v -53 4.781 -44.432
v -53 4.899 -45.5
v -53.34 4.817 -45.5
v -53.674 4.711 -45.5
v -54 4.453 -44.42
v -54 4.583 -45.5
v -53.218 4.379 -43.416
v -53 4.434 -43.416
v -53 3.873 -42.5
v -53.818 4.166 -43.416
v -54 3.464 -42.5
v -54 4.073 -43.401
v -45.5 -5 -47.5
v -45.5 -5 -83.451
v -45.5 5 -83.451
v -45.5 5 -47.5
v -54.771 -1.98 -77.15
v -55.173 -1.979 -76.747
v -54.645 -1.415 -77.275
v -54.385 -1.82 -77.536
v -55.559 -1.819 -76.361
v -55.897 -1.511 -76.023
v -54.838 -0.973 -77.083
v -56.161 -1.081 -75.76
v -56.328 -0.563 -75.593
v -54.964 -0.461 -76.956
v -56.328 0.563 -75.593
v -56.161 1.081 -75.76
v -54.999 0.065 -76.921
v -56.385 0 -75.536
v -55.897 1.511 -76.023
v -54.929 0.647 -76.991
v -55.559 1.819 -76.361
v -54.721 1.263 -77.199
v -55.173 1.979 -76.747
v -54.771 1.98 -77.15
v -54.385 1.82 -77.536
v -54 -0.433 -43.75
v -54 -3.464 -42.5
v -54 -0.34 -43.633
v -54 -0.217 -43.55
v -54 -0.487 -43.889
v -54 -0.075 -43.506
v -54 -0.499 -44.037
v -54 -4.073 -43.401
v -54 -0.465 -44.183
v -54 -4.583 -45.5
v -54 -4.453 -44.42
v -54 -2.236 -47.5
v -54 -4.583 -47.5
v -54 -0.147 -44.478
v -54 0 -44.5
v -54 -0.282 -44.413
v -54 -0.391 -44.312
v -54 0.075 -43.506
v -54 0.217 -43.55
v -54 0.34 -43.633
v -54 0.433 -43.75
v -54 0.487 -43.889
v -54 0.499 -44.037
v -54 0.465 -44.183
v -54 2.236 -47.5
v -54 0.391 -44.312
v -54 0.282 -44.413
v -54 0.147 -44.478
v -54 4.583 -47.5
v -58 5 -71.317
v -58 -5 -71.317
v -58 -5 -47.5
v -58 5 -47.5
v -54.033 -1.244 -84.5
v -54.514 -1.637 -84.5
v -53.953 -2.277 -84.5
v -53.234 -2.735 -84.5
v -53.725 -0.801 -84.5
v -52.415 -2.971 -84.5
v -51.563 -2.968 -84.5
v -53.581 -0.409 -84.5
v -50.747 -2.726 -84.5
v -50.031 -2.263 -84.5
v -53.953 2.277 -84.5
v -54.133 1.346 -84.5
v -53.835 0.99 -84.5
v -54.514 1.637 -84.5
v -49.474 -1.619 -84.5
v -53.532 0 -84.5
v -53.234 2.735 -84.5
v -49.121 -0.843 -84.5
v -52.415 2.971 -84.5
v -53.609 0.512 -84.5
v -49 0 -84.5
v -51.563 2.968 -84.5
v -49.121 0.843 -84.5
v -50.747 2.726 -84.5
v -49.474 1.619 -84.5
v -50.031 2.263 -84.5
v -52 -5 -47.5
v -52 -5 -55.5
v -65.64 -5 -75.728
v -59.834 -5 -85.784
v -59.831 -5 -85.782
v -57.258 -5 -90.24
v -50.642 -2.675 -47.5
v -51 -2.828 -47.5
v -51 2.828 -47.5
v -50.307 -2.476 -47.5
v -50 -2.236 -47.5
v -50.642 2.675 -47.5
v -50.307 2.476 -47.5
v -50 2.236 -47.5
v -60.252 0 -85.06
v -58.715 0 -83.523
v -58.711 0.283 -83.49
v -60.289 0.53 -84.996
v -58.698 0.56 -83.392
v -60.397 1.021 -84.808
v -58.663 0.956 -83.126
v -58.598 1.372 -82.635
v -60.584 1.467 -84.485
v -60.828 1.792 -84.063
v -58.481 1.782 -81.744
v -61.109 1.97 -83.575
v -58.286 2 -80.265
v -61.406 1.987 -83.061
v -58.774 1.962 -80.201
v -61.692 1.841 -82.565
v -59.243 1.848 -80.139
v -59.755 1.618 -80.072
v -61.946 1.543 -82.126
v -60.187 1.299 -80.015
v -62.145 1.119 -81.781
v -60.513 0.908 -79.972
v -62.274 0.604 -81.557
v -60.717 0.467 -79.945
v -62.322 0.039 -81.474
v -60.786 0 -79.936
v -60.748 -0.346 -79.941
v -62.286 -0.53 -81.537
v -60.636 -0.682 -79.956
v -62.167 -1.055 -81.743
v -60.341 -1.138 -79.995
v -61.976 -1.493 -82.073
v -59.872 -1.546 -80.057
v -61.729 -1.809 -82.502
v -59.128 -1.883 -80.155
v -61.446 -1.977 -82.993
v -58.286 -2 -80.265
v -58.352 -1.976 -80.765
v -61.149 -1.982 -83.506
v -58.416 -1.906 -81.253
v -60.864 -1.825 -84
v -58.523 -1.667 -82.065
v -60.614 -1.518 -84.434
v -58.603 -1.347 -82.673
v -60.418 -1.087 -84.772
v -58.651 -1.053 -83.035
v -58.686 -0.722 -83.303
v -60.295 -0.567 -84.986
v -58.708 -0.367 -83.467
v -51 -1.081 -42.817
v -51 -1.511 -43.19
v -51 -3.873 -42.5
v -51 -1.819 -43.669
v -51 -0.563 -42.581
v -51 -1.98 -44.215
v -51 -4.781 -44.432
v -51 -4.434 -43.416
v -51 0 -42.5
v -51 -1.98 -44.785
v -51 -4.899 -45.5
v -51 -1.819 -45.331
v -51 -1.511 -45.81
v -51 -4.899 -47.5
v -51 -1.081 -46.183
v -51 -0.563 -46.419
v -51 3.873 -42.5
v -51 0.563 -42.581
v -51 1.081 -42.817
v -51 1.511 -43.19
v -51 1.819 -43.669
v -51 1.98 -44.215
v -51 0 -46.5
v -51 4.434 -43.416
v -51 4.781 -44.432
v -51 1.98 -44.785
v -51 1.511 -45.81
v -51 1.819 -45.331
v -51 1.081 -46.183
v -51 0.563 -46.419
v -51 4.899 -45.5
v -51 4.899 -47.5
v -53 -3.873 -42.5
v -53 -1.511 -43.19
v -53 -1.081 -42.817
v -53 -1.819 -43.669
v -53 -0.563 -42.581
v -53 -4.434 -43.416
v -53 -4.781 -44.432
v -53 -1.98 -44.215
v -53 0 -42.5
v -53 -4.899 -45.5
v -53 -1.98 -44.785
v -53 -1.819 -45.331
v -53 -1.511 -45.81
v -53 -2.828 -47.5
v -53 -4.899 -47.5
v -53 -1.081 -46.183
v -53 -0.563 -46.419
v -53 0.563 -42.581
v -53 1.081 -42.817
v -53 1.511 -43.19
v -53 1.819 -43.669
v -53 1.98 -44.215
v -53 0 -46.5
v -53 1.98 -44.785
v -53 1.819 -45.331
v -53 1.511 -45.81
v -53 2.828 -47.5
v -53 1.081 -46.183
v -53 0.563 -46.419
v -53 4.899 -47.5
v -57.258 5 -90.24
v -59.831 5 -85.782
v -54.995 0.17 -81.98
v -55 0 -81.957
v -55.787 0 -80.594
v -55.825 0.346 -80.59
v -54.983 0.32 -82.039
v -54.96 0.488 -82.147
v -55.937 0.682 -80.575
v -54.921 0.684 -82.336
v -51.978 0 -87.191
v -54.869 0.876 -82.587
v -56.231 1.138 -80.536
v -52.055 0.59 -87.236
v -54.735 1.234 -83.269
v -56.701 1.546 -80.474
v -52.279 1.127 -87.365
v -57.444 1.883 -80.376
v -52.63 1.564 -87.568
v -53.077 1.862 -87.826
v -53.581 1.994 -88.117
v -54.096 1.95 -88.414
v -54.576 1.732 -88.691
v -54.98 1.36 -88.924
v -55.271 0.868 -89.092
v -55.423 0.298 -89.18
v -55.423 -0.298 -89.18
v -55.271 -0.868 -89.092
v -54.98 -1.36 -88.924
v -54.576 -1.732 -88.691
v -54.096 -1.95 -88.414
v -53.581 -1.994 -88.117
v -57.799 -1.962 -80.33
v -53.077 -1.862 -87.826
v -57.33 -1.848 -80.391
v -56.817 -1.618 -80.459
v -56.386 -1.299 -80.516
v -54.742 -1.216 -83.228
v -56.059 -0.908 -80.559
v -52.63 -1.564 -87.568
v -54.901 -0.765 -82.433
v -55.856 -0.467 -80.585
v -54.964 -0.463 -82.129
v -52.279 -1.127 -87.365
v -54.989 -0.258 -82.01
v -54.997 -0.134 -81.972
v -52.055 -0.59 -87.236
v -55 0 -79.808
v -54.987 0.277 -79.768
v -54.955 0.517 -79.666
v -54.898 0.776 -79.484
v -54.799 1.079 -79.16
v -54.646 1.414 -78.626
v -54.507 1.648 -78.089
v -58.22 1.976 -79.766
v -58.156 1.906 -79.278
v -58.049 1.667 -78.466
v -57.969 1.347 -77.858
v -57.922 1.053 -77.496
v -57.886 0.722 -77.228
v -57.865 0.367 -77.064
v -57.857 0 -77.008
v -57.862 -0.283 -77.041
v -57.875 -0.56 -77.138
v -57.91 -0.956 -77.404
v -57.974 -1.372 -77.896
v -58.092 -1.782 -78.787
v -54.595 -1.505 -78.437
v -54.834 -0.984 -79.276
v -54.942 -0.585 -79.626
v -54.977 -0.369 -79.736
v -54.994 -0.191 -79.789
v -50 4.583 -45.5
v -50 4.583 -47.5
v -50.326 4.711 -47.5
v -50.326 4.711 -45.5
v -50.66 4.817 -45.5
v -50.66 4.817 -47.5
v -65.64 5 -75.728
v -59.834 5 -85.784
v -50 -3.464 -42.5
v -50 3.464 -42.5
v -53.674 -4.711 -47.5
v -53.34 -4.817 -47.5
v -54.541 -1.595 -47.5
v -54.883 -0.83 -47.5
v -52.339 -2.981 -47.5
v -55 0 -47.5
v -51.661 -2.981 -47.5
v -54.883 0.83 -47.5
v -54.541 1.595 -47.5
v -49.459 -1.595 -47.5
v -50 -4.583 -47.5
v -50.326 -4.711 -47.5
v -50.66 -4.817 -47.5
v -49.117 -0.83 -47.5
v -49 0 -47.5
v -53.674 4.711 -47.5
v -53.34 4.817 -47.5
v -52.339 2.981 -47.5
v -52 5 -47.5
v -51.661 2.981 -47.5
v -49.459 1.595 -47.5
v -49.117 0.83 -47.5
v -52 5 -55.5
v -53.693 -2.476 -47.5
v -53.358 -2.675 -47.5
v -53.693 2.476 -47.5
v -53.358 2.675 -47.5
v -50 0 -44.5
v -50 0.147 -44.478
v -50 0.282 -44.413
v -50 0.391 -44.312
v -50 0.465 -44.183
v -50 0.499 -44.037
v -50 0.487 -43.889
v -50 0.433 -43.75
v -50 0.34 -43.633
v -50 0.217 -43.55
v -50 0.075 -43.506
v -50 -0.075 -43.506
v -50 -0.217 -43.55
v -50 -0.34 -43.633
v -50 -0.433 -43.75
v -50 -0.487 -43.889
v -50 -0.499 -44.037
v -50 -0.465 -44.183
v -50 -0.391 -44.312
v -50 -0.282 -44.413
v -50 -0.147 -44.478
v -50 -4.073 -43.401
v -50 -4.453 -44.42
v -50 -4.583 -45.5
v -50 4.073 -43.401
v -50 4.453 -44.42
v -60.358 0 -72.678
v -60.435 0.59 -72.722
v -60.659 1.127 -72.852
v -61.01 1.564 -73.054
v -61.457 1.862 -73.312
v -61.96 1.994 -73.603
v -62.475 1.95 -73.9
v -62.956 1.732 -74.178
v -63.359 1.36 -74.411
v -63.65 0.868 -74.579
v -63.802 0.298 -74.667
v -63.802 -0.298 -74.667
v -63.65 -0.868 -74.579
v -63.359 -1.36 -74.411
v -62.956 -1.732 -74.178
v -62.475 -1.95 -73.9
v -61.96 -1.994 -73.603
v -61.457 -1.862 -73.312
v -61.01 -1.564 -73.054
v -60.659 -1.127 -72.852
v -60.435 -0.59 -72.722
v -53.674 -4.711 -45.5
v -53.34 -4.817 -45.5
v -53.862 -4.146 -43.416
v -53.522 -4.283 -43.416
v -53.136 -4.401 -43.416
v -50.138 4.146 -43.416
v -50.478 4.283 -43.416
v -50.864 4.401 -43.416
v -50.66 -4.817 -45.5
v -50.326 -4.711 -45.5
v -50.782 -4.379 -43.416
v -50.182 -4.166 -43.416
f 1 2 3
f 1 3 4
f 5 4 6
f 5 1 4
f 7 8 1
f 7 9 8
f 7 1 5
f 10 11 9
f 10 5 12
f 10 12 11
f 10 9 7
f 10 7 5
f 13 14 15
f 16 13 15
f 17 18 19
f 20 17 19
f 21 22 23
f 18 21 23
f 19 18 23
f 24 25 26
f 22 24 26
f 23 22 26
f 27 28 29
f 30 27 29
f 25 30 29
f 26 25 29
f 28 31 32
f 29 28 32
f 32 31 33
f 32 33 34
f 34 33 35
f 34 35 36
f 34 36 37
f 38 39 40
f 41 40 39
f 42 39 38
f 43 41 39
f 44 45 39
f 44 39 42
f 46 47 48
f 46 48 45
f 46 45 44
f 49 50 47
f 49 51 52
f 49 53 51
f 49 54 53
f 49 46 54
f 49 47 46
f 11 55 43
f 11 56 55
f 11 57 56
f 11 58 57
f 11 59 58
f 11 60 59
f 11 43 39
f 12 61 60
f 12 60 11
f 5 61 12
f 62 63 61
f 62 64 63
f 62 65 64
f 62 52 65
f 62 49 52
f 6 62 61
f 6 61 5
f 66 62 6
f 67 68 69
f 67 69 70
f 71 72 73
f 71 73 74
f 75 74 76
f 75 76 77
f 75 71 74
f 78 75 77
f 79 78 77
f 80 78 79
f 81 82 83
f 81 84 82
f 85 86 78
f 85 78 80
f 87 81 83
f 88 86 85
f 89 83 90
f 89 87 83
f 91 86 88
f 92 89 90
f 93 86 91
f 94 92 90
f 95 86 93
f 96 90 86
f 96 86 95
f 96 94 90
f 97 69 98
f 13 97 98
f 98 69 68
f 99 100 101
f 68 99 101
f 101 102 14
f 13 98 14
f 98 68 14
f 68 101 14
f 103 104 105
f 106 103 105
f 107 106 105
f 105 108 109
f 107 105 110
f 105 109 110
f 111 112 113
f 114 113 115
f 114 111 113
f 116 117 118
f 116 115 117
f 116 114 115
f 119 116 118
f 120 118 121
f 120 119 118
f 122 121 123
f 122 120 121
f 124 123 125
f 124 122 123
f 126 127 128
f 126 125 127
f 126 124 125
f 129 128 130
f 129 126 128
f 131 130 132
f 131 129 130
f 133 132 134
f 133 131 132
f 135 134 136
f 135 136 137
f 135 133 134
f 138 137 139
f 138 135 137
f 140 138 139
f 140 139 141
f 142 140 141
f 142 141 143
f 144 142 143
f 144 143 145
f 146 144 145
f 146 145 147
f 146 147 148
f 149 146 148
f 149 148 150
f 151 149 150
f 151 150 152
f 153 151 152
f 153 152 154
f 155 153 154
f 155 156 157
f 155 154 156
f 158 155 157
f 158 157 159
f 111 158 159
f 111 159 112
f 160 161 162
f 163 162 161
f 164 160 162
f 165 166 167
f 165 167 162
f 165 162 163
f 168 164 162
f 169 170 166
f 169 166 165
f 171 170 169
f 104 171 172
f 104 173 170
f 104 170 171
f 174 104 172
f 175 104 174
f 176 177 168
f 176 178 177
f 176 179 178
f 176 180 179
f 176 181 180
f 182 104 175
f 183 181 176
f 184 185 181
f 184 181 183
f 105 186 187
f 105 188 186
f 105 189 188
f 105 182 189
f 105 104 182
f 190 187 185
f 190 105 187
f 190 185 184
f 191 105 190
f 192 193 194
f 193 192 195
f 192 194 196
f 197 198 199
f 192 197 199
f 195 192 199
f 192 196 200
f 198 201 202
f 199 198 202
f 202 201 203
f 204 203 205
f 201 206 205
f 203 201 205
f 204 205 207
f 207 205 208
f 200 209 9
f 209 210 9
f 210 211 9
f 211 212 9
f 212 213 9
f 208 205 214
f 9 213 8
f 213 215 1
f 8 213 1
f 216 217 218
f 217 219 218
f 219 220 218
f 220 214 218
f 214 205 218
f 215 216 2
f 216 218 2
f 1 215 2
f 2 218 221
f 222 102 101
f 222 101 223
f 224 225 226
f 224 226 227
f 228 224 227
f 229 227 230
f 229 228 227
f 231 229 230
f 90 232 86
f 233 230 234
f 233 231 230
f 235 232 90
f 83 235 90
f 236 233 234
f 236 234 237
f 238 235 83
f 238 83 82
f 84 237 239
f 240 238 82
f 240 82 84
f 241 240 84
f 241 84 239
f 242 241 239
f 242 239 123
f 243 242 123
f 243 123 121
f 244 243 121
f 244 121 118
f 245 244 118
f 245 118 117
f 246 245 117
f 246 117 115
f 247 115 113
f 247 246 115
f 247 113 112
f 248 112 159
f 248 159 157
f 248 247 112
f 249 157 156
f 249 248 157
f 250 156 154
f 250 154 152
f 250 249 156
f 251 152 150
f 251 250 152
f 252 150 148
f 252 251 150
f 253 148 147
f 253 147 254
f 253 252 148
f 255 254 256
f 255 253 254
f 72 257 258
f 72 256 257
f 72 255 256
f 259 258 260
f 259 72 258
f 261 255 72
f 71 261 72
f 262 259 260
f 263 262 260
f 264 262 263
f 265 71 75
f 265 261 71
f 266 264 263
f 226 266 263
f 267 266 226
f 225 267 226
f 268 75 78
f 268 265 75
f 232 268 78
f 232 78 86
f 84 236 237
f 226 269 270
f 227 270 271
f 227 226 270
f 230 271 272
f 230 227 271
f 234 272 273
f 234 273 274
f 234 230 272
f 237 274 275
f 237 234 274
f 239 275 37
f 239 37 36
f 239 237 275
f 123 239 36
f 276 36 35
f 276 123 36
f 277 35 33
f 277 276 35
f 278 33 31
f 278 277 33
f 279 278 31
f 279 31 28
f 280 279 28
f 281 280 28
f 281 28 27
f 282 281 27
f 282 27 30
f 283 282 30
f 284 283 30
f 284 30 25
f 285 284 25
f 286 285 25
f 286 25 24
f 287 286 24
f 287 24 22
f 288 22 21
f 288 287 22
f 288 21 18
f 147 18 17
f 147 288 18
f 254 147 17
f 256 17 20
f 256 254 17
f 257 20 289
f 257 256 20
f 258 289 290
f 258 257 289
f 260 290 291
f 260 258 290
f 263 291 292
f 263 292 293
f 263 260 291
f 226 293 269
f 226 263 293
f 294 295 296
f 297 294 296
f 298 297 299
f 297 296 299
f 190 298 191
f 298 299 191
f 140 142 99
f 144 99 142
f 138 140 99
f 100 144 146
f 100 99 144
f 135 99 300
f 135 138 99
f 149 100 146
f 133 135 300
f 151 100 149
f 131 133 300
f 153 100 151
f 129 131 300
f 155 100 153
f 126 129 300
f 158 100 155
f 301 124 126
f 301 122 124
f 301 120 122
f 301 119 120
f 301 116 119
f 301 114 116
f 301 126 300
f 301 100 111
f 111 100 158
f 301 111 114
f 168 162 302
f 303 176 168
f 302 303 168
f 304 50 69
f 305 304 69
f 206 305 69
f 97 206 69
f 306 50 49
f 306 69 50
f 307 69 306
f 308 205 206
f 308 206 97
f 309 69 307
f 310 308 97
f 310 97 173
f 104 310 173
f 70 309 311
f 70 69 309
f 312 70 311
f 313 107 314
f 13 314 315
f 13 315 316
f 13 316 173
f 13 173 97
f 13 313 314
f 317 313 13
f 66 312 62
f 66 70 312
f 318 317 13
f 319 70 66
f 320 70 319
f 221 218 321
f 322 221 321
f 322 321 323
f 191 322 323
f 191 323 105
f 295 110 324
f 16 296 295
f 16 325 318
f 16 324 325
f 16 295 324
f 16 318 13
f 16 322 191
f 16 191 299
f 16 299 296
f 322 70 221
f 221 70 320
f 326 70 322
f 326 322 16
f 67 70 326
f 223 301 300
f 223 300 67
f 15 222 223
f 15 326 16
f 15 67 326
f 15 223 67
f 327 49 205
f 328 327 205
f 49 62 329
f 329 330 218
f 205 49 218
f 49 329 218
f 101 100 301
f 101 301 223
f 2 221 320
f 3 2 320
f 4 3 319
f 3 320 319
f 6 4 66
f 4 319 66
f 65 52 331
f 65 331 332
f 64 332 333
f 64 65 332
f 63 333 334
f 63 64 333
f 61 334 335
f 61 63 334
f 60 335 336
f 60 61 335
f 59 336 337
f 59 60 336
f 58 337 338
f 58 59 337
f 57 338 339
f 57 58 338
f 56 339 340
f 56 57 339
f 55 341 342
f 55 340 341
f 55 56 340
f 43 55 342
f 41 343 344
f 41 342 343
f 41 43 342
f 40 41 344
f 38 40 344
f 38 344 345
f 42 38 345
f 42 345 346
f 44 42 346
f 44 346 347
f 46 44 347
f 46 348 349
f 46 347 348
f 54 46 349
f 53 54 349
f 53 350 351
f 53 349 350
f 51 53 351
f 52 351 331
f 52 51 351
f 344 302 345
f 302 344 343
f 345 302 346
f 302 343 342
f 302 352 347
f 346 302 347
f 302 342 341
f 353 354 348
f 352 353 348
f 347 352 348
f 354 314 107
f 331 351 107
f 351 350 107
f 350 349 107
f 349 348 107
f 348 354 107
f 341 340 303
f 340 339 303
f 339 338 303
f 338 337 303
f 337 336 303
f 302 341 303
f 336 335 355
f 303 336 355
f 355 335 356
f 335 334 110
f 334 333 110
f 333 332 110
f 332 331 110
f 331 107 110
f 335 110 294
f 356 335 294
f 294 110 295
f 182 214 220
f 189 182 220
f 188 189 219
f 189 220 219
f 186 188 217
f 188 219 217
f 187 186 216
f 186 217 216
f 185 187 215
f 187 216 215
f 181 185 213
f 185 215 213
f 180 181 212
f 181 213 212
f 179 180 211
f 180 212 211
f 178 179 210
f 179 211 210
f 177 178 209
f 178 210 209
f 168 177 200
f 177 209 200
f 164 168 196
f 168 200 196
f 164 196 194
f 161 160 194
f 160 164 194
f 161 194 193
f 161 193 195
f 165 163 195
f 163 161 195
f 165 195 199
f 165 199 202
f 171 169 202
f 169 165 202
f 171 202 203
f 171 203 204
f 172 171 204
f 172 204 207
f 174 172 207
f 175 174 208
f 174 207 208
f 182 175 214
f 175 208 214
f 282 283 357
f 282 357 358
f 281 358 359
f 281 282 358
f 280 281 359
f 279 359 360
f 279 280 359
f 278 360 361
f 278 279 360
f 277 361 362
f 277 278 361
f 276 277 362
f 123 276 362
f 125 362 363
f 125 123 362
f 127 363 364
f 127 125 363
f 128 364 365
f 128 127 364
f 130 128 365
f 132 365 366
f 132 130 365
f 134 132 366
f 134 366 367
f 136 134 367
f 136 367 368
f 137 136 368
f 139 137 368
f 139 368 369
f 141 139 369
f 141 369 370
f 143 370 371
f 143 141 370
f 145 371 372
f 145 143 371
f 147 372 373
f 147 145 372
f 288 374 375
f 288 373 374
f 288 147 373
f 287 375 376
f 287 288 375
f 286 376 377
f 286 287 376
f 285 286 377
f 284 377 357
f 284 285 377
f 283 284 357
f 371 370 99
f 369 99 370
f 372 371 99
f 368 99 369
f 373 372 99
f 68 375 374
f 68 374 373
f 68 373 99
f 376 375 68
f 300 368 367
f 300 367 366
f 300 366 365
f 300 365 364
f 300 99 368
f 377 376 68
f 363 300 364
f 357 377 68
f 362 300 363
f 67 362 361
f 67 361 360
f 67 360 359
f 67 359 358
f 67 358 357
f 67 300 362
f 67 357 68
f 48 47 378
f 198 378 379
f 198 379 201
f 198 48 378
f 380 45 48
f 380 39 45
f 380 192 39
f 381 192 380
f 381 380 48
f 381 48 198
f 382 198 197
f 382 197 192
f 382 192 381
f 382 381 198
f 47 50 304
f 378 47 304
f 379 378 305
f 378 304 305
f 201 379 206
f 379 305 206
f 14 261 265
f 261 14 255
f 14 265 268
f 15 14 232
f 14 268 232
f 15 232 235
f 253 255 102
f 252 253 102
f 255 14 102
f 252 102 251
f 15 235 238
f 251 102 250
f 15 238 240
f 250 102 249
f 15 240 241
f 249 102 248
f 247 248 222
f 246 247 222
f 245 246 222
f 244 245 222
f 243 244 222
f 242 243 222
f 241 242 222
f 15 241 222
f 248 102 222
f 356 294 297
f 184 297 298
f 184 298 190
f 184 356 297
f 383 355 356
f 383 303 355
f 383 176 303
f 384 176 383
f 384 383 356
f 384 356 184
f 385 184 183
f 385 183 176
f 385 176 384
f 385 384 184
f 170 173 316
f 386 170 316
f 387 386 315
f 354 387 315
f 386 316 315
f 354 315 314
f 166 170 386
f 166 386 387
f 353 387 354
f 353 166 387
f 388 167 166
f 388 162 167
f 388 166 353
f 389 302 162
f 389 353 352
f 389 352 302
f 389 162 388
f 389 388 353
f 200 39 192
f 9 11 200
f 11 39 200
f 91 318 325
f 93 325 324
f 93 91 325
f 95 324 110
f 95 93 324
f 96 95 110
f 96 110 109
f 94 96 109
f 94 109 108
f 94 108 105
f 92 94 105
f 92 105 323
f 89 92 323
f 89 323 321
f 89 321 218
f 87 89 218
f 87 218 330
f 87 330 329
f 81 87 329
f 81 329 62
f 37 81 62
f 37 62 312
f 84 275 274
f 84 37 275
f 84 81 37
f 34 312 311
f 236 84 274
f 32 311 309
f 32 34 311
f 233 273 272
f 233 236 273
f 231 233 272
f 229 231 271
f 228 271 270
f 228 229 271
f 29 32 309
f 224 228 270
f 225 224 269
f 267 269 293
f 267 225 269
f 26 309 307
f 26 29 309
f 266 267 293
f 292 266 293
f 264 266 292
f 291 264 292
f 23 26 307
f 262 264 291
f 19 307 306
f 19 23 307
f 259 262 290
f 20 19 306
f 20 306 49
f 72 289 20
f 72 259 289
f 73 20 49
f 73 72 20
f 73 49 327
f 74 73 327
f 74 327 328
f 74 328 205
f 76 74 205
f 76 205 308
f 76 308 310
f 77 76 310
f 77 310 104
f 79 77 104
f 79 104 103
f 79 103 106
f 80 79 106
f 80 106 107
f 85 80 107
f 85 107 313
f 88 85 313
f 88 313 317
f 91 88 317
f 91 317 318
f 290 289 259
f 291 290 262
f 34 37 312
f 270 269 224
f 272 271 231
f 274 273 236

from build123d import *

# Parameters (mm, degrees)
BOX139_W                    = 15
BOX139_H                    = 21
BOX139_DEPTH                = 23
BOX139_PLACEMENT_ANGLE      = 60
CYLINDER260_R               = 2
CYLINDER260_DEPTH           = 46
CYLINDER260_PLACEMENT_ANGLE = 330
CYLINDER227_R               = 2
CYLINDER227_DEPTH           = 10
CYLINDER227_PLACEMENT_ANGLE = 45
CYLINDER224_R               = 3
CYLINDER224_DEPTH           = 37
CYLINDER222_R               = 0.5
CYLINDER222_DEPTH           = 10
CYLINDER219_R               = 2
CYLINDER219_DEPTH           = 4
CYLINDER223_R               = 3
CYLINDER223_DEPTH           = 10
BOX110_W                    = 10
BOX110_H                    = 10
BOX110_DEPTH                = 10
BOX108_W                    = 2
BOX108_H                    = 10
BOX108_DEPTH                = 10
BOX109_W                    = 10
BOX109_H                    = 10
BOX109_DEPTH                = 10
CYLINDER221_R               = 5
CYLINDER221_DEPTH           = 10
CYLINDER220_R               = 5
CYLINDER220_DEPTH           = 10
BOX101_W                    = 10
BOX101_H                    = 10
BOX101_DEPTH                = 20
BOX101_PLACEMENT_ANGLE      = 330
BOX100_W                    = 12
BOX100_H                    = 10
BOX100_DEPTH                = 17
BOX100_PLACEMENT_ANGLE      = 30
BOX098_W                    = 12.5
BOX098_H                    = 10
BOX098_DEPTH                = 43


with BuildPart() as cube139:
    # Box139 → Box139 (new body)
    with BuildSketch(Plane.XY):
        with Locations((7.5, 10.5)):
            Rectangle(BOX139_W, BOX139_H)
    extrude(amount=BOX139_DEPTH)


with BuildPart() as cube139_1:
    # Box139 placement: moved
    add(cube139.part.moved(Location((-59.2, -11, -91.360962))).rotate(Axis((-59.2, -11, -91.360962), (0, 1, 0)), BOX139_PLACEMENT_ANGLE))


with BuildPart() as cylinder260:
    # Cylinder260 → Cylinder260 (new body)
    with BuildSketch(Plane.XY):
        Circle(CYLINDER260_R)
    extrude(amount=CYLINDER260_DEPTH)


with BuildPart() as cylinder260_1:
    # Cylinder260 placement: moved
    add(cylinder260.part.moved(Location((-50.83, 0, -93.18))).rotate(Axis((-50.83, 0, -93.18), (0, 1, 0)), CYLINDER260_PLACEMENT_ANGLE))


with BuildPart() as cylinder227:
    # Cylinder227 → Cylinder227 (new body)
    with BuildSketch(Plane.XY):
        Circle(CYLINDER227_R)
    extrude(amount=CYLINDER227_DEPTH)


with BuildPart() as cylinder227_1:
    # Cylinder227 placement: moved
    add(cylinder227.part.moved(Location((-62.041631, 0, -84.020815))).rotate(Axis((-62.041631, 0, -84.020815), (0, 1, 0)), CYLINDER227_PLACEMENT_ANGLE))


with BuildPart() as cylinder224:
    # Cylinder224 → Cylinder224 (new body)
    with BuildSketch(Plane(origin=(-52, 0, -84.5), x_dir=(1, 0, 0), z_dir=(0, 0, 1))):
        Circle(CYLINDER224_R)
    extrude(amount=CYLINDER224_DEPTH)


with BuildPart() as cylinder222:
    # Cylinder222 → Cylinder222 (new body)
    with BuildSketch(Plane(origin=(-5, 0, -7), x_dir=(0, 0, -1), z_dir=(1, 0, 0))):
        Circle(CYLINDER222_R)
    extrude(amount=CYLINDER222_DEPTH)


with BuildPart() as cylinder219:
    # Cylinder219 → Cylinder219 (new body)
    with BuildSketch(Plane(origin=(-2, -50, 1), x_dir=(0, 0, -1), z_dir=(1, 0, 0))):
        Circle(CYLINDER219_R)
    extrude(amount=CYLINDER219_DEPTH)


with BuildPart() as cylinder223:
    # Cylinder223 → Cylinder223 (new body)
    with BuildSketch(Plane(origin=(0, -50, -12), x_dir=(1, 0, 0), z_dir=(0, 0, 1))):
        Circle(CYLINDER223_R)
    extrude(amount=CYLINDER223_DEPTH)


with BuildPart() as cube110:
    # Box110 → Box110 (new body)
    with BuildSketch(Plane(origin=(-12, -55, -2), x_dir=(1, 0, 0), z_dir=(0, 0, 1))):
        with Locations((5, 5)):
            Rectangle(BOX110_W, BOX110_H)
    extrude(amount=BOX110_DEPTH)


with BuildPart() as cube108:
    # Box108 → Box108 (new body)
    with BuildSketch(Plane(origin=(-1, -55, -2), x_dir=(1, 0, 0), z_dir=(0, 0, 1))):
        with Locations((1, 5)):
            Rectangle(BOX108_W, BOX108_H)
    extrude(amount=BOX108_DEPTH)


with BuildPart() as cube109:
    # Box109 → Box109 (new body)
    with BuildSketch(Plane(origin=(2, -55, -2), x_dir=(1, 0, 0), z_dir=(0, 0, 1))):
        with Locations((5, 5)):
            Rectangle(BOX109_W, BOX109_H)
    extrude(amount=BOX109_DEPTH)


with BuildPart() as cylinder221:
    # Cylinder221 → Cylinder221 (new body)
    with BuildSketch(Plane(origin=(0, -50, -10), x_dir=(1, 0, 0), z_dir=(0, 0, 1))):
        Circle(CYLINDER221_R)
    extrude(amount=CYLINDER221_DEPTH)


with BuildPart() as sphere045:
    # Sphere045 → Sphere045 (revolve)
    with BuildSketch(Plane.XZ.offset(50)):
        with BuildLine():
            ThreePointArc((5, 0), (3.535534, 3.535534), (0, 5))
            Line((0, 5), (0, 0))
            Line((0, 0), (5, 0))
        make_face()
    revolve(axis=Axis((0, -50, 0), (0, 0, 1)))


with BuildPart() as cut204006013:
    # Cylinder220 → Cylinder220 (new body)
    with BuildSketch(Plane(origin=(0, -50, -7), x_dir=(1, 0, 0), z_dir=(0, 0, 1))):
        Circle(CYLINDER220_R)
    extrude(amount=CYLINDER220_DEPTH)

    # Common038: intersect Sphere045
    add(sphere045.part, mode=Mode.INTERSECT)

    # Fusion005077020006: union Cylinder221
    add(cylinder221.part)

    # Cut204006012: cut Cube109
    add(cube109.part, mode=Mode.SUBTRACT)

    # Cut204006014: cut Cube108
    add(cube108.part, mode=Mode.SUBTRACT)

    # Cut204006015: cut Cube110
    add(cube110.part, mode=Mode.SUBTRACT)

    # Cut204006011: cut Cylinder223
    add(cylinder223.part, mode=Mode.SUBTRACT)

    # Fusion005077020005: union Cylinder219
    add(cylinder219.part)


with BuildPart() as cut204006013_1:
    # Fusion005077020007 placement: moved
    add(cut204006013.part.moved(Location((0, 50, -8.5))))

    # Cut204006013: cut Cylinder222
    add(cylinder222.part, mode=Mode.SUBTRACT)


with BuildPart() as cut204006013_2:
    # Cut204006013 placement: moved
    add(cut204006013_1.part.moved(Location((-52, 0, -37))))


with BuildPart() as cube101:
    # Box101 → Box101 (new body)
    with BuildSketch(Plane.XY):
        with Locations((5, 5)):
            Rectangle(BOX101_W, BOX101_H)
    extrude(amount=BOX101_DEPTH)


with BuildPart() as cube101_1:
    # Box101 placement: moved
    add(cube101.part.moved(Location((-168.49167, -5, -108.102886))).rotate(Axis((-168.49167, -5, -108.102886), (0, 1, 0)), BOX101_PLACEMENT_ANGLE))


with BuildPart() as cube100:
    # Box100 → Box100 (new body)
    with BuildSketch(Plane.XY):
        with Locations((6, 5)):
            Rectangle(BOX100_W, BOX100_H)
    extrude(amount=BOX100_DEPTH)


with BuildPart() as cube100_1:
    # Box100 placement: moved
    add(cube100.part.moved(Location((-167.14, -5, -90.45))).rotate(Axis((-167.14, -5, -90.45), (0, -1, 0)), BOX100_PLACEMENT_ANGLE))


with BuildPart() as cut204006069001:
    # Box098 → Box098 (new body)
    with BuildSketch(Plane(origin=(-168, -5, -90.5), x_dir=(1, 0, 0), z_dir=(0, 0, 1))):
        with Locations((6.25, 5)):
            Rectangle(BOX098_W, BOX098_H)
    extrude(amount=BOX098_DEPTH)

    # Fusion005077020: union Cube100
    add(cube100_1.part)

    # Cut204006: cut Cube101
    add(cube101_1.part, mode=Mode.SUBTRACT)


with BuildPart() as cut204006069001_1:
    # Cut204006001 placement: moved
    add(cut204006069001.part.moved(Location((110, 0, 0))))

    # Fusion005077020009: union Cut204006013
    add(cut204006013_2.part)

    # Cut204006018: cut Cylinder224
    add(cylinder224.part, mode=Mode.SUBTRACT)

    # Cut204006019: cut Cylinder227
    add(cylinder227_1.part, mode=Mode.SUBTRACT)

    # Cut204006067: cut Cylinder260
    add(cylinder260_1.part, mode=Mode.SUBTRACT)

    # Cut204006069: cut Cube139
    add(cube139_1.part, mode=Mode.SUBTRACT)


solid = cut204006069001_1.part
